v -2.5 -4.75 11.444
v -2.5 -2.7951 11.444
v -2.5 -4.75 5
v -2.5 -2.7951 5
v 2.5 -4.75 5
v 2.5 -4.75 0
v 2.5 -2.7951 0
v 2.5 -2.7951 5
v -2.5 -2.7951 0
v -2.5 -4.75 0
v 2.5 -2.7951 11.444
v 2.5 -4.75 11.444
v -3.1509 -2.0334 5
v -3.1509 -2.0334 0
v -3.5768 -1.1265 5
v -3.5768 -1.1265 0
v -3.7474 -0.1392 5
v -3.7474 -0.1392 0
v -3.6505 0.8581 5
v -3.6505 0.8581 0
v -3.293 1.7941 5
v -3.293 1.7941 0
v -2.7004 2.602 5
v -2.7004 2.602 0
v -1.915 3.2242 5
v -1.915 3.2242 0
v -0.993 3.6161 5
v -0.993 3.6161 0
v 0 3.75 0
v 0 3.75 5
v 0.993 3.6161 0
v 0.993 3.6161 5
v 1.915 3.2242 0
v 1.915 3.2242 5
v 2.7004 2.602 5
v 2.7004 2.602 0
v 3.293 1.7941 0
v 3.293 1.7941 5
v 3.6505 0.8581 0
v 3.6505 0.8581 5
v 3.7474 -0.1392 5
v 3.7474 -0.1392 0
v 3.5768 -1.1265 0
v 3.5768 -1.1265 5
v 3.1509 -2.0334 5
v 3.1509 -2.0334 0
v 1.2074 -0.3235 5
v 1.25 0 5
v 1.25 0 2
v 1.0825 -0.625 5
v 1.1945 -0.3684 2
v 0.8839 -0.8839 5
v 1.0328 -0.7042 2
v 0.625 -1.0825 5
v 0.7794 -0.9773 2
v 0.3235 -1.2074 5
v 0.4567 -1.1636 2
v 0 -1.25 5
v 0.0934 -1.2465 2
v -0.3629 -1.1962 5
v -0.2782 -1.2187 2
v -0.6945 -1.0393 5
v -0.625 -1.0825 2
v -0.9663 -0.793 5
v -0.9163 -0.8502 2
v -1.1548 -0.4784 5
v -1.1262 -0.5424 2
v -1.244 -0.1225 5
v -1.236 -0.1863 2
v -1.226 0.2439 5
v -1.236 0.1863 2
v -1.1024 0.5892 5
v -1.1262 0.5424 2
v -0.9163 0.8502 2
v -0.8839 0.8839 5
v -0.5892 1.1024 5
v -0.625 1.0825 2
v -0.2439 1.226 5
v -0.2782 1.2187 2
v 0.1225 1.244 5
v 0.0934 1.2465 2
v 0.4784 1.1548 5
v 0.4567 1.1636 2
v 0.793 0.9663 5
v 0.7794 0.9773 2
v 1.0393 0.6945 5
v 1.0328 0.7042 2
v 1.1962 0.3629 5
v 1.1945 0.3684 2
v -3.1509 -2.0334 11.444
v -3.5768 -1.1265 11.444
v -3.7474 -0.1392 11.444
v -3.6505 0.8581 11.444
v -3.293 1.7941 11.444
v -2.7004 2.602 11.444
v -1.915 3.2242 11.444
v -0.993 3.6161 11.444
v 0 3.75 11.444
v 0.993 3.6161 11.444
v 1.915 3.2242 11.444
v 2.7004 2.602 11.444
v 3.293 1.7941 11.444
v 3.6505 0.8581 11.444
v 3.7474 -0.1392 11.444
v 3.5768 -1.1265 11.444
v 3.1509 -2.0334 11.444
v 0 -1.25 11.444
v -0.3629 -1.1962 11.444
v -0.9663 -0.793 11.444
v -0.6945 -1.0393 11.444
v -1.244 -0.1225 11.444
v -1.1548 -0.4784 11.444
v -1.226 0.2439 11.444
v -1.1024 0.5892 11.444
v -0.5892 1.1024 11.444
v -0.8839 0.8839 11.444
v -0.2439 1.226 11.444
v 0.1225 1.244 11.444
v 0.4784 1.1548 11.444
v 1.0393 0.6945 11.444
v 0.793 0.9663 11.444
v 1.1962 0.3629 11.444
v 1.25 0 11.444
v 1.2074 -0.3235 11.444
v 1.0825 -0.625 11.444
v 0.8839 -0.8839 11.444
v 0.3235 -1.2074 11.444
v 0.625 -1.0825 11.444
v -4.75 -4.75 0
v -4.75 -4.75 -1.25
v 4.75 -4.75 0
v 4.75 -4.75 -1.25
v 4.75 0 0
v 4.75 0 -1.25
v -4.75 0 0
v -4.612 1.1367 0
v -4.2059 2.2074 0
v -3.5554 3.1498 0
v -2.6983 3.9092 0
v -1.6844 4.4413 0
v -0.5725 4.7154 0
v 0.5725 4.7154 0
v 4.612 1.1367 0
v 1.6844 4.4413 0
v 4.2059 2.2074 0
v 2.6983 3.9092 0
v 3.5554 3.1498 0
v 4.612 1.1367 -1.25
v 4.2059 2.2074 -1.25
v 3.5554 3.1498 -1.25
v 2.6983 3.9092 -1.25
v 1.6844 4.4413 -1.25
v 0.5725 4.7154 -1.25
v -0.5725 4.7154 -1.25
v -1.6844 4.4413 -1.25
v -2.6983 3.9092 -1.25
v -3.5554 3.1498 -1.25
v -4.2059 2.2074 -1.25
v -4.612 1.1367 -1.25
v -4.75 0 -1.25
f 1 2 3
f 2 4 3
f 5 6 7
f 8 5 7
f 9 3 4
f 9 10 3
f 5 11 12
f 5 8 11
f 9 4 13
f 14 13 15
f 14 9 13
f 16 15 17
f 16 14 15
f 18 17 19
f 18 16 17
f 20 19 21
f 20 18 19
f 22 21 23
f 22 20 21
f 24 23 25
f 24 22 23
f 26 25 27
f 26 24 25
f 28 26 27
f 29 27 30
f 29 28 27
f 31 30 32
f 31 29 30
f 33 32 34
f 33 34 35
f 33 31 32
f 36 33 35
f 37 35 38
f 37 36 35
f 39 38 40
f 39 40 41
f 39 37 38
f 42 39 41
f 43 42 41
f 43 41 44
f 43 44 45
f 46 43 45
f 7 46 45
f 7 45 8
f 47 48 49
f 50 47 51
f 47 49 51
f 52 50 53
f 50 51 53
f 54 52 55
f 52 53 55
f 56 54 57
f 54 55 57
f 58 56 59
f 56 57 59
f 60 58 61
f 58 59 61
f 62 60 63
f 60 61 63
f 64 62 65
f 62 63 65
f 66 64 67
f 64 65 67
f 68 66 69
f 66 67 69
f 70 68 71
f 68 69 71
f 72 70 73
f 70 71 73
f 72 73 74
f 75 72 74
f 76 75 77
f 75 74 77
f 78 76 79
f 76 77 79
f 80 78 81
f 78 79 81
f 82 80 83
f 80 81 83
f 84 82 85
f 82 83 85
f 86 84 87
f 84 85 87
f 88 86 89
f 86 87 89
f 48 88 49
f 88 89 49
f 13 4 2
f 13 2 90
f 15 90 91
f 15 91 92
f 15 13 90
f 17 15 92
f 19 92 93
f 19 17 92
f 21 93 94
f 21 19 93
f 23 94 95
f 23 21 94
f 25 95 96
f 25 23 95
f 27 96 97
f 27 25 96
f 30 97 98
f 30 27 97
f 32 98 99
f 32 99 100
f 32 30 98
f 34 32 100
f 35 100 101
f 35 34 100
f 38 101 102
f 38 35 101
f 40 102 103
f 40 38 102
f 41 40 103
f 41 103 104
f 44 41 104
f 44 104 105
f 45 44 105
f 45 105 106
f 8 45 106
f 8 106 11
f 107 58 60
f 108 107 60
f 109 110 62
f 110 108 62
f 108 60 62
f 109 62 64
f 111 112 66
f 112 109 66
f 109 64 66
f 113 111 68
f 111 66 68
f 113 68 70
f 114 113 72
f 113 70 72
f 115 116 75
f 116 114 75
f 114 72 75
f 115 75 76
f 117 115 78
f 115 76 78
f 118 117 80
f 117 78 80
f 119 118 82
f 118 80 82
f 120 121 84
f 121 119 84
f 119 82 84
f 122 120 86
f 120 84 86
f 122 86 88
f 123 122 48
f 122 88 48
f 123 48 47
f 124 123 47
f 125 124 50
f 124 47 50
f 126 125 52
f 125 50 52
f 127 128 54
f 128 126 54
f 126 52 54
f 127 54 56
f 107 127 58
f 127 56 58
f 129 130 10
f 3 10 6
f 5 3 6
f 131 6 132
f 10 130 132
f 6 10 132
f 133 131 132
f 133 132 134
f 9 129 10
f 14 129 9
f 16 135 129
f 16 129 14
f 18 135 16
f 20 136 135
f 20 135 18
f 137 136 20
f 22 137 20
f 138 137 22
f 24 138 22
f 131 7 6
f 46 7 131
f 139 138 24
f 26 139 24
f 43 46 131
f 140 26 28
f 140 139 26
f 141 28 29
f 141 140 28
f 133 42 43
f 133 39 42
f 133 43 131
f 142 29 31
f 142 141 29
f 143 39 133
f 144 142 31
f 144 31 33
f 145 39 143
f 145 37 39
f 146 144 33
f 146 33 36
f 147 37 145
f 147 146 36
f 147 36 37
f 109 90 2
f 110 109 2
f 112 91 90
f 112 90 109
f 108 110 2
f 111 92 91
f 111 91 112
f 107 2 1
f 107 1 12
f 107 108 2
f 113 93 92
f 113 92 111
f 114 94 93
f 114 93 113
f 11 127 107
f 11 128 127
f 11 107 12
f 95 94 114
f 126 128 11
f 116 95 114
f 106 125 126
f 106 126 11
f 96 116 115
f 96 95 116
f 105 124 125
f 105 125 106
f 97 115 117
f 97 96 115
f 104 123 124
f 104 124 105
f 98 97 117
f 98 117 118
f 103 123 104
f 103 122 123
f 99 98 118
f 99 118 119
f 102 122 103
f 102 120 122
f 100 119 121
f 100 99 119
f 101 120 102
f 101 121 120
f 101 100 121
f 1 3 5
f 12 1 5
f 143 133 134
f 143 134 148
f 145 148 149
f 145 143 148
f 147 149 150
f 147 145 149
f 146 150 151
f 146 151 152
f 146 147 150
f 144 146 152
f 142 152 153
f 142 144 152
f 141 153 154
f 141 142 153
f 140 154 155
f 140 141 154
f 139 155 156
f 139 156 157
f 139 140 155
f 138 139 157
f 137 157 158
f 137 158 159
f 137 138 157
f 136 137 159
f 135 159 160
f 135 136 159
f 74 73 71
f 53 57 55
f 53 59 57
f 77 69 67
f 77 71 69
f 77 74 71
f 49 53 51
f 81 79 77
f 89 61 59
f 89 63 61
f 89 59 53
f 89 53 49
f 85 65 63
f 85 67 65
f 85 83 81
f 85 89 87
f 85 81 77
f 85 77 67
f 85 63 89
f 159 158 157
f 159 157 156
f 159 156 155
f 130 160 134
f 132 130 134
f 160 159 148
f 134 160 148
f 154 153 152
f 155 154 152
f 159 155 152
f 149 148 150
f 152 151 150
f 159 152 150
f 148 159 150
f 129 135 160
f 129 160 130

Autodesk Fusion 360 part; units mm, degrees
sketch "Sketch1" plane through (0, 0, 0) normal (0, 0, 1) x (1, 0, 0)
  circle A0 centre (0, 0) radius 3.75
  circle A1 centre (0, 0) radius 1.25
  circle A2 centre (0, 0) radius 4.75
  line L0 (0, 0) -> (0, -4.75)
  line L1 (0, -4.75) -> (2.5, -4.75)
  line L2 (0, -4.75) -> (-2.5, -4.75)
  line L3 (2.5, -4.75) -> (2.5, -2.7951)
  line L4 (-2.5, -4.75) -> (-2.5, -2.7951)
  line L5 (2.5, -4.75) -> (4.75, -4.75)
  line L6 (4.75, -4.75) -> (4.75, 0)
  line L7 (-4.75, 0) -> (-4.75, -4.75)
  line L8 (-4.75, -4.75) -> (-2.5, -4.75)
  dimension "d1" = 7.5
  dimension "d2" = 2.5
  dimension "d3" = 9.5
  dimension "d4" = 2.5
  dimension "d5" = 2.5
  dimension "d10" = 2.25
extrude "Extrude1" add sketch "Sketch1" along normal blind 5 contours A0 | A0 A2 L0 L4 | A0 A2 L0 L3 | A2 L2 L4 | A2 L1 L3
extrude "Extrude2" add sketch "Sketch1" along normal blind 2 contours A1
extrude "Extrude3" add sketch "Sketch1" against normal blind 1.25 contours A1 | A0 | A0 A2 L3 L4 | A0 A2 L0 L4 | A0 A2 L0 L3 | A2 L4 L7 L8 | A2 L2 L4 | A2 L1 L3 | A2 L3 L5 L6
extrude "Extrude4" add 1 faces at (-0.9543, -2.5804, 5) along direction (0, 0, 1) blind 6.444
extrude "Extrude5" [suppressed]
extrude "Extrude6" [suppressed]
